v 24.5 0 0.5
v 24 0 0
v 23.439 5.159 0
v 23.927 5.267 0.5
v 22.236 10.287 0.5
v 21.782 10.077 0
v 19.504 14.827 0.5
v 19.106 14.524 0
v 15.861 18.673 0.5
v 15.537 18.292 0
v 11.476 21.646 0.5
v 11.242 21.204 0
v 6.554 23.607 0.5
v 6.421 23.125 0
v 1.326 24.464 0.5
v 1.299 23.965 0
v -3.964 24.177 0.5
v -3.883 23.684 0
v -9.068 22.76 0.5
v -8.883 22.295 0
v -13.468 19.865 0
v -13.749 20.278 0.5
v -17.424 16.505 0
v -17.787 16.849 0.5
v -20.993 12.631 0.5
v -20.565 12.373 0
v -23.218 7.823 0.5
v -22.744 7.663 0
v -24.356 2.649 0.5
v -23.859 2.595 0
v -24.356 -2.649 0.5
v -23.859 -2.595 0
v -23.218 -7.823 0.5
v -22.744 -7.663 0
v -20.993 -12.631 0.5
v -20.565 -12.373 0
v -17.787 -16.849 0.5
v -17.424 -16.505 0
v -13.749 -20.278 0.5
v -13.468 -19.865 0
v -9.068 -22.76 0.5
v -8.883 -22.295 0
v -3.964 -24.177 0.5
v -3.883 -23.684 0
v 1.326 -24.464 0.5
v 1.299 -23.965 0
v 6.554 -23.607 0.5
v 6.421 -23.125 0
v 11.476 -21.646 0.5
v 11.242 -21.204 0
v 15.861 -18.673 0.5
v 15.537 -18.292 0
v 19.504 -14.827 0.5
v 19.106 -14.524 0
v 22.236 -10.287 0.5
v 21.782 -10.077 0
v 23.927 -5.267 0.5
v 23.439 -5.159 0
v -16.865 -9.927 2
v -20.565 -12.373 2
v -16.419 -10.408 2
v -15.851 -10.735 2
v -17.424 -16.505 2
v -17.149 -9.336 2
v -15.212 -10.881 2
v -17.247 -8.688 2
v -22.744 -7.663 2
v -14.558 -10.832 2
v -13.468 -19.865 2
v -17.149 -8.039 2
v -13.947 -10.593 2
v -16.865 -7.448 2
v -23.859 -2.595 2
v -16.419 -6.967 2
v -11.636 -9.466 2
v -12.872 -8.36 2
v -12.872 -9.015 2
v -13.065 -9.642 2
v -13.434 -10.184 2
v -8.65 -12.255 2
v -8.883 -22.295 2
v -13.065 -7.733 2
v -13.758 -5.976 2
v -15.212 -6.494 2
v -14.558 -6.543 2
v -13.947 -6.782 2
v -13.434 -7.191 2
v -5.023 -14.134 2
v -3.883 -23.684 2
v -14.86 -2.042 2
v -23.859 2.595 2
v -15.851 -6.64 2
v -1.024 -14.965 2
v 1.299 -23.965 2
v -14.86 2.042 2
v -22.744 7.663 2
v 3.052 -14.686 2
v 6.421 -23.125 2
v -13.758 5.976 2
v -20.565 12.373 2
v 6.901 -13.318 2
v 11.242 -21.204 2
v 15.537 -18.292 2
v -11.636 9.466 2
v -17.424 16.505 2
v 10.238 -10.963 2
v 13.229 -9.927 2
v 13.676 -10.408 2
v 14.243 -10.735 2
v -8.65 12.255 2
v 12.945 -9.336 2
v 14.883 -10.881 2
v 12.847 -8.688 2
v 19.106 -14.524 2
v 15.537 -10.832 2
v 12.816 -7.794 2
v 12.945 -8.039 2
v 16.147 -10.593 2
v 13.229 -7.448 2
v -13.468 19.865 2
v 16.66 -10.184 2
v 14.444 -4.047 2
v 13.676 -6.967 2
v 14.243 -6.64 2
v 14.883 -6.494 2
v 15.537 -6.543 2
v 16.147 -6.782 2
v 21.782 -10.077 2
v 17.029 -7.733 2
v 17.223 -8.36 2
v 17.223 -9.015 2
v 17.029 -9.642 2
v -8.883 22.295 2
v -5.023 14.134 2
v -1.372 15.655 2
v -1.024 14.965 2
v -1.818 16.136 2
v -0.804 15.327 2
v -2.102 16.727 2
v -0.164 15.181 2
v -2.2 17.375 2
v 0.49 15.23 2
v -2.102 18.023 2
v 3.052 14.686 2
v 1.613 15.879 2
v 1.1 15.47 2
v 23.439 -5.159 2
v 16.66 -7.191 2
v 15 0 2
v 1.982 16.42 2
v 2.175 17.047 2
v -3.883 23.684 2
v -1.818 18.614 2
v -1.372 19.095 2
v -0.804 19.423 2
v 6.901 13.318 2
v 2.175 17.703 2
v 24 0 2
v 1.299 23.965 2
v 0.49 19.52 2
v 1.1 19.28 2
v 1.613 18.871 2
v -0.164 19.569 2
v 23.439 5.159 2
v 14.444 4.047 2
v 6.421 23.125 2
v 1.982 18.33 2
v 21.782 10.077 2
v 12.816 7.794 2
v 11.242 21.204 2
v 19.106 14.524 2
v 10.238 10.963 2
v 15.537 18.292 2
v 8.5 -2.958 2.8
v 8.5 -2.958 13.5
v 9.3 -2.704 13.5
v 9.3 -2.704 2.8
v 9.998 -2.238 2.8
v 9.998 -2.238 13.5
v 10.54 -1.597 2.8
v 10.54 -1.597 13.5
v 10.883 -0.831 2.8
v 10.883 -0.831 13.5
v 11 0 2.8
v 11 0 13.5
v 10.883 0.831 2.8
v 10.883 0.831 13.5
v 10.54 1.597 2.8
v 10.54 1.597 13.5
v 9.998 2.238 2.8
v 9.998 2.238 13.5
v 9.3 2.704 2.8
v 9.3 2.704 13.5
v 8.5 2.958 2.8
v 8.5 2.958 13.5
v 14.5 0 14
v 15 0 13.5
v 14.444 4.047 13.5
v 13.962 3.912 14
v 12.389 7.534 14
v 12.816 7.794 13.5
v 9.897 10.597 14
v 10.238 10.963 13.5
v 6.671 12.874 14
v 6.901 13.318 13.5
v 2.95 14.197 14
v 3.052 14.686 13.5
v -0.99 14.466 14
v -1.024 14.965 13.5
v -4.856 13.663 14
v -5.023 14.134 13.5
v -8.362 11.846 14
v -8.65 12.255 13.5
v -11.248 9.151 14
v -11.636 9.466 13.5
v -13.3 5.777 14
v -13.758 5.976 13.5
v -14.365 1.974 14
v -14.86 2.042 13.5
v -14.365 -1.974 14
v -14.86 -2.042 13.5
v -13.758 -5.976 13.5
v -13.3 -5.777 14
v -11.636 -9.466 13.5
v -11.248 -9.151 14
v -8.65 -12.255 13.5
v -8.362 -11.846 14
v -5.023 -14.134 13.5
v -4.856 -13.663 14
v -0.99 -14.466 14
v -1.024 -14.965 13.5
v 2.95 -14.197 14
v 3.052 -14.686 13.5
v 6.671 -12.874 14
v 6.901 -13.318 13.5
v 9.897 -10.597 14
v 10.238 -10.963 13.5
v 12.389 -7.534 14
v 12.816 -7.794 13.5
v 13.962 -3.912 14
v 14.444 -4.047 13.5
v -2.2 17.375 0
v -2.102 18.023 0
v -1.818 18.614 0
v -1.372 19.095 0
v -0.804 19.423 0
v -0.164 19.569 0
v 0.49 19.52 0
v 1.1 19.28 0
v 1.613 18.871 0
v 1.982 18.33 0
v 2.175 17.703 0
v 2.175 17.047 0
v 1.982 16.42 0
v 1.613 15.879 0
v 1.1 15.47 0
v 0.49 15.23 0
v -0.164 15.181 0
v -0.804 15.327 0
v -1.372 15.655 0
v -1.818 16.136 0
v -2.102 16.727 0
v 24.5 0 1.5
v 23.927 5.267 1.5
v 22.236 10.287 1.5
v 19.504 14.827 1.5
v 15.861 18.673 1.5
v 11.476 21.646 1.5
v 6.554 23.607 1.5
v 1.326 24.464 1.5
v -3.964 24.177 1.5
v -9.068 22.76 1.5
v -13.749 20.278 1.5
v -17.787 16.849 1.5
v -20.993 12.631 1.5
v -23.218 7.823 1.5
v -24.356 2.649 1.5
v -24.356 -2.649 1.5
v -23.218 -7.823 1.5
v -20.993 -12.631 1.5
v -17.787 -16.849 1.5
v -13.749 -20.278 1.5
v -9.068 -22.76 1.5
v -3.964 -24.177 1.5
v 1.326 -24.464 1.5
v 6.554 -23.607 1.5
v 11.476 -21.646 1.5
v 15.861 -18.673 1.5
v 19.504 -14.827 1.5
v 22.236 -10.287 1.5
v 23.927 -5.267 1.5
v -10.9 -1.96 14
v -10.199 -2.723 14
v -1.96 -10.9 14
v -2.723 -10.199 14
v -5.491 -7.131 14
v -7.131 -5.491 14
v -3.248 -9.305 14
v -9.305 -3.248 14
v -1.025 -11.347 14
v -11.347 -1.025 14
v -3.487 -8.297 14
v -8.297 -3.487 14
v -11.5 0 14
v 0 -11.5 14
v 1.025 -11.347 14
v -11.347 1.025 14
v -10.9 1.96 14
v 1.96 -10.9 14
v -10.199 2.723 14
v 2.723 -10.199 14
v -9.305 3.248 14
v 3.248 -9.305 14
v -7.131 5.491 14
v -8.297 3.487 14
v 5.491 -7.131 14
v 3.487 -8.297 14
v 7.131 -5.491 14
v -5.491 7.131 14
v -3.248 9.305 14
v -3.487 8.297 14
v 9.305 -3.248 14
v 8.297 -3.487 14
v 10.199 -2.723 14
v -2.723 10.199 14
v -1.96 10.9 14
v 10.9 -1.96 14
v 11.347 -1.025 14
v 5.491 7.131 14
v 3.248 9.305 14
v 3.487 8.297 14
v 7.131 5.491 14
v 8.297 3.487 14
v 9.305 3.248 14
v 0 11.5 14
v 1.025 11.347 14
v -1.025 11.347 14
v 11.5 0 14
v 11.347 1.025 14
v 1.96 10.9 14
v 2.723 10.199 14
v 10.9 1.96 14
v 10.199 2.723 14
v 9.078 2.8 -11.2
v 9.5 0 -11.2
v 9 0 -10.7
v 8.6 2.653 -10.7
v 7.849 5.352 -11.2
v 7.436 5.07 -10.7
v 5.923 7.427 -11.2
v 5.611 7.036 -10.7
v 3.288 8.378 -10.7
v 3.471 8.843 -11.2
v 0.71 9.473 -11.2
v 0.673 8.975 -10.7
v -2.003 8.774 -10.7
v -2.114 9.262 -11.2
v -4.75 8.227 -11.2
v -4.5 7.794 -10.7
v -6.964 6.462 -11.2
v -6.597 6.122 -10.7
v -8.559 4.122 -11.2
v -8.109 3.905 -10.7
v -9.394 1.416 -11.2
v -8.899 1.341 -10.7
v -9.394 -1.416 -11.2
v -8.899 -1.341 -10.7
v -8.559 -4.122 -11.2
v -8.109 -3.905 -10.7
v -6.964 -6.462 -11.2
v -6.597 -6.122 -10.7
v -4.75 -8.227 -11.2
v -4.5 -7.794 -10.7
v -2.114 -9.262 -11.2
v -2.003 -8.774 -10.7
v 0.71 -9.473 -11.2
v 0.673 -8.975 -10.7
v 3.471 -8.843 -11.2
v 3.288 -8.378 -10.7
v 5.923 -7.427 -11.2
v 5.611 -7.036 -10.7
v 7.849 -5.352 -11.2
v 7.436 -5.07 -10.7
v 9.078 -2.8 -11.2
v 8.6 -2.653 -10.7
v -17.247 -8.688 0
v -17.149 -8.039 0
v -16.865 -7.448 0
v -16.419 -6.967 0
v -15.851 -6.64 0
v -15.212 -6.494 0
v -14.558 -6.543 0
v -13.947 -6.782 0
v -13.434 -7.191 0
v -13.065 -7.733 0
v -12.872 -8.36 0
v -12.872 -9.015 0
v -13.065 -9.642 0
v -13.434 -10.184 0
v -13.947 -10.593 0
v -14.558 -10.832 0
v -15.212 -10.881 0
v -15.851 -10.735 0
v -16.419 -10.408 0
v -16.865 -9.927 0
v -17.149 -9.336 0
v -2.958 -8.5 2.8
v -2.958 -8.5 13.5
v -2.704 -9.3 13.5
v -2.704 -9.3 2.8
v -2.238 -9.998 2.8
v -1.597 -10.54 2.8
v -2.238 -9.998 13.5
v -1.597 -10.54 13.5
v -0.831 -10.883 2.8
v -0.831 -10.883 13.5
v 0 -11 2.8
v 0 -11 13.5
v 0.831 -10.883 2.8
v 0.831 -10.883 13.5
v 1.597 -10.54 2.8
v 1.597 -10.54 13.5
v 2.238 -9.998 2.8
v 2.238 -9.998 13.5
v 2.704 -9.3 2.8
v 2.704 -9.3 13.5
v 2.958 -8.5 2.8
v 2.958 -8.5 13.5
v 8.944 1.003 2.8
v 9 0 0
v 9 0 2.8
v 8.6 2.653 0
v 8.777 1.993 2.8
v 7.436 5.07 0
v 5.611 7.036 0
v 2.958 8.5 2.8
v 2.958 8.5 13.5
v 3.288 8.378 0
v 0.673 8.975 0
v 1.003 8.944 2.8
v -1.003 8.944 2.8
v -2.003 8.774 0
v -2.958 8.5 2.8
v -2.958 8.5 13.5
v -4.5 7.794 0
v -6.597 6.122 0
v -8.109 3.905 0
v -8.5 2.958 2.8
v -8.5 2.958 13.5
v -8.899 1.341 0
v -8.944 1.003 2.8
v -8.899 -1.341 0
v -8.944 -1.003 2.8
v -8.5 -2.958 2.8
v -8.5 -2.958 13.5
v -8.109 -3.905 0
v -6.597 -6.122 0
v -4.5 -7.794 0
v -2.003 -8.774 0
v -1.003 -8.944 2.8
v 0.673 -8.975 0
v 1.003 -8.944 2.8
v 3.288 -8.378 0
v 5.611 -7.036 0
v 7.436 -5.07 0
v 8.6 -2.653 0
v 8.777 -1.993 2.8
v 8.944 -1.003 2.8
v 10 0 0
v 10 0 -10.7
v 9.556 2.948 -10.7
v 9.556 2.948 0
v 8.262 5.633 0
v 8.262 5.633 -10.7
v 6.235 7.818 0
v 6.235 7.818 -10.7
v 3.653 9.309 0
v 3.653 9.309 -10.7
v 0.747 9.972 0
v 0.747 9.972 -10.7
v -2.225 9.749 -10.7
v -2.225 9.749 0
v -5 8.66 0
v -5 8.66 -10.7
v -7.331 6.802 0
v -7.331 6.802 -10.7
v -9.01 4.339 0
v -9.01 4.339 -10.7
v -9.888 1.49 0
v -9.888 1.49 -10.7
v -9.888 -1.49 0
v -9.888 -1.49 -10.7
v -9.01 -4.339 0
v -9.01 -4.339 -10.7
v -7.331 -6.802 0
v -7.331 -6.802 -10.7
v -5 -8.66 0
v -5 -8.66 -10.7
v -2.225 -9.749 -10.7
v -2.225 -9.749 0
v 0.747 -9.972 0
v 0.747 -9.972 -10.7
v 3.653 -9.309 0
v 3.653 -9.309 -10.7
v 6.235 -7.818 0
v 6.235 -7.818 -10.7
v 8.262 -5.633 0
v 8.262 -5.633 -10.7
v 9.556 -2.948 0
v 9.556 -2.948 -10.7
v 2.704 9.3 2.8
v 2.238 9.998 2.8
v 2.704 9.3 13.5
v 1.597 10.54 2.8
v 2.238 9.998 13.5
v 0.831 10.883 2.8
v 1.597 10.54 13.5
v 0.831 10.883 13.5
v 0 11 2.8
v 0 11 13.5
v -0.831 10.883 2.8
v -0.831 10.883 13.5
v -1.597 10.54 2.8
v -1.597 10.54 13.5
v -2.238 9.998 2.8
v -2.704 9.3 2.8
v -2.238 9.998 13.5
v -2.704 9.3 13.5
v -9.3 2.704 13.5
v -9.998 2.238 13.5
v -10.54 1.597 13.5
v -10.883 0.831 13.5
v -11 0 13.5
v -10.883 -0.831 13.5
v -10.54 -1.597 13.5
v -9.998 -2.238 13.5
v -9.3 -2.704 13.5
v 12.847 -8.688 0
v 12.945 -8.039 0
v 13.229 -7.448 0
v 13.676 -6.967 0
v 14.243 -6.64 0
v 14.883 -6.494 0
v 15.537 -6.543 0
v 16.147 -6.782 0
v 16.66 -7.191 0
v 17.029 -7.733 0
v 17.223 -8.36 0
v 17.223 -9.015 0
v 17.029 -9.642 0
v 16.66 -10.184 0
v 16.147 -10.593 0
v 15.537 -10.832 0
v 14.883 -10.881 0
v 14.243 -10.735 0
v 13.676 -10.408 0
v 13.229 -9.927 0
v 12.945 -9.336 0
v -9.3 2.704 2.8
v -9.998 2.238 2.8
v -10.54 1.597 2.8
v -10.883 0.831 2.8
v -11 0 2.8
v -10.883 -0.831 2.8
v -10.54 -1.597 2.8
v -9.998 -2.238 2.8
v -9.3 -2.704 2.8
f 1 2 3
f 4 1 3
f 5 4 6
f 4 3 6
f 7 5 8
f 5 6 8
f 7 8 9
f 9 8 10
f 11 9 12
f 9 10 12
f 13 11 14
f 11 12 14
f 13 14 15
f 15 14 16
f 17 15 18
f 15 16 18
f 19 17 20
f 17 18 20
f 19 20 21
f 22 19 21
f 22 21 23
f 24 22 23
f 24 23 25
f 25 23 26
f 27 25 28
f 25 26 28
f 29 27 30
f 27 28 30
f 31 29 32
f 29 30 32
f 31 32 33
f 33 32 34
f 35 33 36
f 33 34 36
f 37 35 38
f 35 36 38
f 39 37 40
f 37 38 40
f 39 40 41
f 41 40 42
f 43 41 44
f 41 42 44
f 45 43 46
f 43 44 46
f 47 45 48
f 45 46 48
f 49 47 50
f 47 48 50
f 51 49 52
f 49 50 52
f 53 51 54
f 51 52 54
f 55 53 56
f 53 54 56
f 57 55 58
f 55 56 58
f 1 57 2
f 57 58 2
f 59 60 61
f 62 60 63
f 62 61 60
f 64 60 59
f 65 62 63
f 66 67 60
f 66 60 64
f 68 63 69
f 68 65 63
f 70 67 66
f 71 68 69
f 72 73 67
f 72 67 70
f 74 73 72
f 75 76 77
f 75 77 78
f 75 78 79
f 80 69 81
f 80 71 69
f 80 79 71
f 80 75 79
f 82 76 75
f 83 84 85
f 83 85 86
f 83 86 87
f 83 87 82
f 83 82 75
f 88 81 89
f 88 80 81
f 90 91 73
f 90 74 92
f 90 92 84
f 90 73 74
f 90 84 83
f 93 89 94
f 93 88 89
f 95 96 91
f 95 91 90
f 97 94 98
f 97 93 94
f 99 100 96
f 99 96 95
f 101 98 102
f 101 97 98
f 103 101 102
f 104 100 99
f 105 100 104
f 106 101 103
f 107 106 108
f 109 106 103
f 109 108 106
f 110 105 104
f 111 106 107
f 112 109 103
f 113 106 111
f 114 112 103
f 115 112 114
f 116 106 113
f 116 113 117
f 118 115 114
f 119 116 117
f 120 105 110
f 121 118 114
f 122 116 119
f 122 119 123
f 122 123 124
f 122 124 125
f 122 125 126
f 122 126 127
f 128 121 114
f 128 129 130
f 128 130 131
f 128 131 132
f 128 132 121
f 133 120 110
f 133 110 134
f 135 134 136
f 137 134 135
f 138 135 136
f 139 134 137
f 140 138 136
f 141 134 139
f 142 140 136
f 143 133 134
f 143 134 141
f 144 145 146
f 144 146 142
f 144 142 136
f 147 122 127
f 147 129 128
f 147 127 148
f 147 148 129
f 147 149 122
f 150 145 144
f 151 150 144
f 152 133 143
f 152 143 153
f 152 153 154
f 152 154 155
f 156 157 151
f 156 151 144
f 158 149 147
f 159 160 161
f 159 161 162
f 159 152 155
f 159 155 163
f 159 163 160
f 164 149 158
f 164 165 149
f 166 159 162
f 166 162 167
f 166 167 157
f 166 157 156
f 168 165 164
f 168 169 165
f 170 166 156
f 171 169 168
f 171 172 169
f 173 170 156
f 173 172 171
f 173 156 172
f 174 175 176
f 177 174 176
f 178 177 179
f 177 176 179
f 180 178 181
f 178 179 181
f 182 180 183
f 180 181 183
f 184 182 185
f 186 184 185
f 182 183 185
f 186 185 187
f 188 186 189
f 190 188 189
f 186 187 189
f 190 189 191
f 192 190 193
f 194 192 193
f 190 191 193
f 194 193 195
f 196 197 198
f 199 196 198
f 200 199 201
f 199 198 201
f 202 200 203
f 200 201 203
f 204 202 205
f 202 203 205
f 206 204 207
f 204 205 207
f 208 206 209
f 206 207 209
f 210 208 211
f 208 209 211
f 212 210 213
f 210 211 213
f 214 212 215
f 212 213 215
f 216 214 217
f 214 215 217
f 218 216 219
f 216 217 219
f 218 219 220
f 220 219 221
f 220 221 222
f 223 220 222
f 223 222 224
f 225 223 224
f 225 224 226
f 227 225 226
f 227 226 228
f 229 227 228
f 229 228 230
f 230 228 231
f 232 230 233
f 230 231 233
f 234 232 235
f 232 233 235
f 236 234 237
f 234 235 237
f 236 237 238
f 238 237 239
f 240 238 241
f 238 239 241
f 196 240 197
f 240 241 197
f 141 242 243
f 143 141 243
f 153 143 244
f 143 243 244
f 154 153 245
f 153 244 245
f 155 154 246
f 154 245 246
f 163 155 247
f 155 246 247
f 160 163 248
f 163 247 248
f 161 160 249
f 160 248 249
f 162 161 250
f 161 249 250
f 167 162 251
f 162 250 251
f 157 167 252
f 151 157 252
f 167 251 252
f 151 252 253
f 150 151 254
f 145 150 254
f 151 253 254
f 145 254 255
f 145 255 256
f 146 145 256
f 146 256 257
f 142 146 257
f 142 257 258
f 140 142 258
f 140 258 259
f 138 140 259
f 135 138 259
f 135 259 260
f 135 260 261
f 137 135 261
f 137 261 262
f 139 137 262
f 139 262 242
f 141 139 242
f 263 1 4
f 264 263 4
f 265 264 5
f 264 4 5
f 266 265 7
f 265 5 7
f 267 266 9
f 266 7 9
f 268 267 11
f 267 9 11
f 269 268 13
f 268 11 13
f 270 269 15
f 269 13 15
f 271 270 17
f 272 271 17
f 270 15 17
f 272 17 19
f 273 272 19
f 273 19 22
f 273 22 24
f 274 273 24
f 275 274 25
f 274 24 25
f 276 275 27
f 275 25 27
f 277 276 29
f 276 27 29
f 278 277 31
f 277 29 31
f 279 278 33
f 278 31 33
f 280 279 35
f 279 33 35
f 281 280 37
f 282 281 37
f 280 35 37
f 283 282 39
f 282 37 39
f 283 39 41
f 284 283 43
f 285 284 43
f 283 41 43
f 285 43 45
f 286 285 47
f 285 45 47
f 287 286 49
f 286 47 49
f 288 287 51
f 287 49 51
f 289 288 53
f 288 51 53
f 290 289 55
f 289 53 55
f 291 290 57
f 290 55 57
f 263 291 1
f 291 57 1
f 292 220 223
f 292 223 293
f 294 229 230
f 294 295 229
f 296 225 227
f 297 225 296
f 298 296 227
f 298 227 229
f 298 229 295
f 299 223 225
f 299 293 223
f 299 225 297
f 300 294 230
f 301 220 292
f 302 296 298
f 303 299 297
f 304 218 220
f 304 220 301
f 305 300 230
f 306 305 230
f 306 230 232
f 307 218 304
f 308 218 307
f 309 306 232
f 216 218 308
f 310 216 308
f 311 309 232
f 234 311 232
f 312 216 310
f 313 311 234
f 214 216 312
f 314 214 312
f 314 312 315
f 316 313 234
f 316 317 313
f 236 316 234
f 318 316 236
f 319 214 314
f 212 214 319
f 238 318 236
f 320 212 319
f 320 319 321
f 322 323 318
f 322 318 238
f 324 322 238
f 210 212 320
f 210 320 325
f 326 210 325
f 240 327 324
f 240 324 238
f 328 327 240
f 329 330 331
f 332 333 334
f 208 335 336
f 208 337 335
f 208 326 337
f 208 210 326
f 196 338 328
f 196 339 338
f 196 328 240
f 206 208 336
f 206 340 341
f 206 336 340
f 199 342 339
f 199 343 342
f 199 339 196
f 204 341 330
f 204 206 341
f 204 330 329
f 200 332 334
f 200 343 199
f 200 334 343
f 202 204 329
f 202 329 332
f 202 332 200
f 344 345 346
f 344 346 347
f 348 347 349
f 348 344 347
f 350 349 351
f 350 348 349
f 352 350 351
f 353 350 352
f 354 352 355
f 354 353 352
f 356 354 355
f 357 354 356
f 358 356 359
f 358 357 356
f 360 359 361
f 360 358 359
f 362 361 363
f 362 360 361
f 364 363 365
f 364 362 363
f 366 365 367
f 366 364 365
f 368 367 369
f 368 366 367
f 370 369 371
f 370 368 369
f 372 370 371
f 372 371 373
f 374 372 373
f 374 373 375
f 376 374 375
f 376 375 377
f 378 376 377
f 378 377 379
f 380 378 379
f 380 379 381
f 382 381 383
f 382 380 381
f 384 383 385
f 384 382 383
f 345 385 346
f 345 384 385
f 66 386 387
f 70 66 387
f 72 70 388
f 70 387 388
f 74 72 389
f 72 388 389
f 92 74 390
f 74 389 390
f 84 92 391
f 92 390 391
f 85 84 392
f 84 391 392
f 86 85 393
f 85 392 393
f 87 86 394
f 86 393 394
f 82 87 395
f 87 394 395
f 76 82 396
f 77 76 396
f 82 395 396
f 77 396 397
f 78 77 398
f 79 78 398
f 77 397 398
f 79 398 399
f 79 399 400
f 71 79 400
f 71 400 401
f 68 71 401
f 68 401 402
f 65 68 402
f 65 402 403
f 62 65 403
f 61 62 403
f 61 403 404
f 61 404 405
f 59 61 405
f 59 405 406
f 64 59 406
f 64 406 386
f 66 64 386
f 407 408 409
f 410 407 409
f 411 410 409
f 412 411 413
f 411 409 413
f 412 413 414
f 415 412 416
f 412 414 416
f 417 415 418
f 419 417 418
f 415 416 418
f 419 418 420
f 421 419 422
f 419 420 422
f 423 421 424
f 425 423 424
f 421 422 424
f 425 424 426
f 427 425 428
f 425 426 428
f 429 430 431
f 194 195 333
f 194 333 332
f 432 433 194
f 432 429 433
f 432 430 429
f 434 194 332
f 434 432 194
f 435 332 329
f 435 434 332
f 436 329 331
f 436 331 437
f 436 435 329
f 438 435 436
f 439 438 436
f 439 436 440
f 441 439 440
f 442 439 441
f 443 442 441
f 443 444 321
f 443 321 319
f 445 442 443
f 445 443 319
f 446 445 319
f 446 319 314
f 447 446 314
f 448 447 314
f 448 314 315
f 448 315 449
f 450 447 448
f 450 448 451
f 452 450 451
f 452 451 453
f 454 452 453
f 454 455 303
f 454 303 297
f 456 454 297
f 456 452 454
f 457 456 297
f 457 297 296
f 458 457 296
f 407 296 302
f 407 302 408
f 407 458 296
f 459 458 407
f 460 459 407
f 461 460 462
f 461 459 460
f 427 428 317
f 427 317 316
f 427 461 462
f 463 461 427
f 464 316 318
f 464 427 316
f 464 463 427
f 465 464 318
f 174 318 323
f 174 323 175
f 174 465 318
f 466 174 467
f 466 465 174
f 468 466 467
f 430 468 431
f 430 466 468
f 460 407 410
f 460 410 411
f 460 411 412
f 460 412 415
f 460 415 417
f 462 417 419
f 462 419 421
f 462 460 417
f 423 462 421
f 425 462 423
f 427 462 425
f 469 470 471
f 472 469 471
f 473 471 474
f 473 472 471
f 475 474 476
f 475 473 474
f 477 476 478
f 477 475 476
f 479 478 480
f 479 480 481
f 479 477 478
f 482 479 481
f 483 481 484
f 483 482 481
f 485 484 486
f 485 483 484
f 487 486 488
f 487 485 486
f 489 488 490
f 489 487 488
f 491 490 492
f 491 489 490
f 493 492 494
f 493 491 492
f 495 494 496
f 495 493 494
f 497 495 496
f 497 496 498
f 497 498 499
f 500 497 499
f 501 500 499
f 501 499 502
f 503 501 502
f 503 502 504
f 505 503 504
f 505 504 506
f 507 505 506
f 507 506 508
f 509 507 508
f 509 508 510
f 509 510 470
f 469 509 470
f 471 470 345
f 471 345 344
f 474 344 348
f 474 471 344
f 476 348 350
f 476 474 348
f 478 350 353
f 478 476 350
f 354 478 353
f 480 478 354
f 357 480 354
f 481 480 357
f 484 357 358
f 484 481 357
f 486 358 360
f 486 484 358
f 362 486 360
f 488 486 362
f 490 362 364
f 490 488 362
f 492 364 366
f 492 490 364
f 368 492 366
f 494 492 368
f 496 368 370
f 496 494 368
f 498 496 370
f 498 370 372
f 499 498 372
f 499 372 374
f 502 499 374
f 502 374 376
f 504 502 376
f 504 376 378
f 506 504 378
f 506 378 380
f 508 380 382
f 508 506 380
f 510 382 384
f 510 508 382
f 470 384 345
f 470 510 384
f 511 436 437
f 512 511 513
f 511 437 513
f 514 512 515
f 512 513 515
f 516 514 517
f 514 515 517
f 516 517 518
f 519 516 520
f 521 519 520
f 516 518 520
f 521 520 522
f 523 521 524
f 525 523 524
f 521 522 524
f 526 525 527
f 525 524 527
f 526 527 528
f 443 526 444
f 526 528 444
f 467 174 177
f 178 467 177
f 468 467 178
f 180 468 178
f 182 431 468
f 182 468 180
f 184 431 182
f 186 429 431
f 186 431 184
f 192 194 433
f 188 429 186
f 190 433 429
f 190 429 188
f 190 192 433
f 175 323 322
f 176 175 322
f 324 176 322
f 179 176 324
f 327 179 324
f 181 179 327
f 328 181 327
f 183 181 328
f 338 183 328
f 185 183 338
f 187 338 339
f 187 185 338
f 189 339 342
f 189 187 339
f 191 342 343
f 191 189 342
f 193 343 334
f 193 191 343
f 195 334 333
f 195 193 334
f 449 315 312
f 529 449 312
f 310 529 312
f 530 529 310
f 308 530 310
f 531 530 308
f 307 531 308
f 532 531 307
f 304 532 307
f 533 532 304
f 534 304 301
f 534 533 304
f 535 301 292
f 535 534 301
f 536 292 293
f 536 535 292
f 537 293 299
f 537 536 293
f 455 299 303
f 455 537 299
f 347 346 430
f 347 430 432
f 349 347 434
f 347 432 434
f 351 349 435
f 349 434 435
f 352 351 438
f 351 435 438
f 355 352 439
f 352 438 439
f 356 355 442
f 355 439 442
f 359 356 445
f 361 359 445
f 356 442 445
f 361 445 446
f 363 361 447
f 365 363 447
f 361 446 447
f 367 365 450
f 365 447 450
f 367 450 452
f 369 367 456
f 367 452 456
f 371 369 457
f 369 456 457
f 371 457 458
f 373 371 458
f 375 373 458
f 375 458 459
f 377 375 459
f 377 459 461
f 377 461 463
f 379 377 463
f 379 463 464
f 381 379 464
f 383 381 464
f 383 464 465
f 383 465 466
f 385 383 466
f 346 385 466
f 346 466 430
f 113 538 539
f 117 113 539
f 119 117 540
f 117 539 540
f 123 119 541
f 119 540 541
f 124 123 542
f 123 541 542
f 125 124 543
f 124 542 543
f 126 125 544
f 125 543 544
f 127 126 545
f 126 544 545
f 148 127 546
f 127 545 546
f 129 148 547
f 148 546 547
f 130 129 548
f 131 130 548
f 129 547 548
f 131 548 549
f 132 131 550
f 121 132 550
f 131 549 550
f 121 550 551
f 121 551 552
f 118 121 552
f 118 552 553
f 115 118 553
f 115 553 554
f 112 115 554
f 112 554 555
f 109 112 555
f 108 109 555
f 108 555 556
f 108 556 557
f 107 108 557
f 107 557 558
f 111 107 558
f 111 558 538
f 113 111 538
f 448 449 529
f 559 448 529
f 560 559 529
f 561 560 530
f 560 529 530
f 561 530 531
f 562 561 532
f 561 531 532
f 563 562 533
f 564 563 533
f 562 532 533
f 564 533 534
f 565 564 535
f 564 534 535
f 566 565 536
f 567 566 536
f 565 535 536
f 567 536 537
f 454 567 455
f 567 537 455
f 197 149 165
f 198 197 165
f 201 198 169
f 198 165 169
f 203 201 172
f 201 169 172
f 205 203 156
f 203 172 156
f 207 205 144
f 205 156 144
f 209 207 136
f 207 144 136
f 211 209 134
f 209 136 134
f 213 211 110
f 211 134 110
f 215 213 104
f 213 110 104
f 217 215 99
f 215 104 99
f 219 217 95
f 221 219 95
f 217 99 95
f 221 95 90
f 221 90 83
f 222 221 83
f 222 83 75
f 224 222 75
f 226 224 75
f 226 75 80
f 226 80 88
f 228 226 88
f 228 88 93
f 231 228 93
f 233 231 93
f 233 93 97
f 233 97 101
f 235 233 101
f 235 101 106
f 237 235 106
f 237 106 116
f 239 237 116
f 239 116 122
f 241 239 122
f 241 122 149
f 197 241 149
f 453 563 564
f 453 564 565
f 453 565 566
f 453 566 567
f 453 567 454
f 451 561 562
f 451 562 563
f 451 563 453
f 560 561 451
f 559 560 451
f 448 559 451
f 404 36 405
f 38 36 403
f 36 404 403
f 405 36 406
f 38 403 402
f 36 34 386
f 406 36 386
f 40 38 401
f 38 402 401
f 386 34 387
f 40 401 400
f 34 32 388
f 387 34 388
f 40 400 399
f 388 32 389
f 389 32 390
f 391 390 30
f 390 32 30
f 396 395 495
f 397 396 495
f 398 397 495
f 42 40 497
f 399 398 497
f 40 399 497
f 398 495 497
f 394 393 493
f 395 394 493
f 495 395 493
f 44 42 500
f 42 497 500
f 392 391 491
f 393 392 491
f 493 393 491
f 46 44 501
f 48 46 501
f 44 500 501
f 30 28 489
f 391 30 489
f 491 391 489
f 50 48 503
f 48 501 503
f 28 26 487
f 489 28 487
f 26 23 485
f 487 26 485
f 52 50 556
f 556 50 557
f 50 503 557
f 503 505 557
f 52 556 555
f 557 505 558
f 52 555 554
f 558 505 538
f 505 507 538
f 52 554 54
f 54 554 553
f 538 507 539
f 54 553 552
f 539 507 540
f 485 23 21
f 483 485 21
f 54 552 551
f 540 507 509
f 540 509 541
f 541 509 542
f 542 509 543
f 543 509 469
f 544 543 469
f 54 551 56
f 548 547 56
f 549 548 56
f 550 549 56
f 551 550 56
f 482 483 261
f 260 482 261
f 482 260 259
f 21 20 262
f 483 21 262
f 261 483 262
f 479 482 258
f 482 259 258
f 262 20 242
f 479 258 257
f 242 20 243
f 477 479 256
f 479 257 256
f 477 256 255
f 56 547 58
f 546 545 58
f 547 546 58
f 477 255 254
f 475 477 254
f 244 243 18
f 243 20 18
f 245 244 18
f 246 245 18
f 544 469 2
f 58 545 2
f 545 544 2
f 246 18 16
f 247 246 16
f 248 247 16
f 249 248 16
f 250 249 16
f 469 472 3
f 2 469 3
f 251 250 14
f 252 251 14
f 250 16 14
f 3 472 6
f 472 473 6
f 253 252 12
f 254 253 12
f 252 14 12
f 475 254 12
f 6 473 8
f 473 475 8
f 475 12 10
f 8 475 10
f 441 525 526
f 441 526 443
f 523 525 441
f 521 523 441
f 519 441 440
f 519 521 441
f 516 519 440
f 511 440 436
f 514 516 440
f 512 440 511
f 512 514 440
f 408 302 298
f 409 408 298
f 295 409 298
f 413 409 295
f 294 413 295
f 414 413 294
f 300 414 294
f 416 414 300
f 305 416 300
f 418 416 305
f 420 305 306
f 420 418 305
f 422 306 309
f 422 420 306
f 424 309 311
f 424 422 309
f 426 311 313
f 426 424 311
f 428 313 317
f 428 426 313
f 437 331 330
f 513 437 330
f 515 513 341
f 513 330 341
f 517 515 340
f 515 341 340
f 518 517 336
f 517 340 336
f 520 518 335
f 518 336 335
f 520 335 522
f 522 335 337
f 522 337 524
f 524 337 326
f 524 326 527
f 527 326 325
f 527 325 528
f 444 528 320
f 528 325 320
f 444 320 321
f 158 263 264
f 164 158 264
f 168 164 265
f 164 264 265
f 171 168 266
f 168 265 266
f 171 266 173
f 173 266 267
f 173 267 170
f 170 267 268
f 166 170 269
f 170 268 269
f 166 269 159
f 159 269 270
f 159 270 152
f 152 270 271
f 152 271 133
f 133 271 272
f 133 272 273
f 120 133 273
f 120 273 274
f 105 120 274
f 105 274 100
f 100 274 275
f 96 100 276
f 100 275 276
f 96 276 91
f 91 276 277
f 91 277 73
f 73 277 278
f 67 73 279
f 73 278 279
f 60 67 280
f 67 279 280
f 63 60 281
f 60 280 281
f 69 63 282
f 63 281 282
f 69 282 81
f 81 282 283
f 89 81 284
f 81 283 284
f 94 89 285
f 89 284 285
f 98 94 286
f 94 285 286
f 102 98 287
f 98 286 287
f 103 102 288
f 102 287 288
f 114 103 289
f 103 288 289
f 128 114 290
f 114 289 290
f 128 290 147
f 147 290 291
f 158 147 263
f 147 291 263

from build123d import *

# Parameters (mm, degrees)
F0_R      = 24.5
F0_R_2    = 15
F1_DEPTH  = 2
F2_R      = 15
F3_DEPTH  = 14
F5_DEPTH  = 11.2
F6_R      = 10
F6_R_2    = 9
F7_DEPTH  = 14
F8_DEPTH  = 25
F10_D     = 4.4
F11_SIZE2 = 0.49999
F11_SIZE  = 0.49999


# Not quite as in the source:
# - a fillet or chamfer is up to 0.001 mm smaller than in the source, because OpenCascade refuses the exact size


with BuildPart() as f1:
    # F0 (on Top) → F1 (new body)
    with BuildSketch(Plane.XY):
        Circle(F0_R)
        Circle(F0_R_2, mode=Mode.SUBTRACT)
    extrude(amount=F1_DEPTH)

    # F2 (on Top) → F3 (join)
    with BuildSketch(Plane.XY):
        Circle(F2_R)
    extrude(amount=F3_DEPTH)

    # F4 (on face) → F5 (cut)
    with BuildSketch(Plane.XY.offset(14)):
        with BuildLine():
            ThreePointArc((7.4375, -2.9467938085), (7.8581168228, -1.5), (8, 0))
            ThreePointArc((8, 0), (7.8581168228, 1.5), (7.4375, 2.9467938085))
            ThreePointArc((7.4375, 2.9467938085), (5.6568542495, 5.6568542495), (2.9467938085, 7.4375))
            ThreePointArc((2.9467938085, 7.4375), (0, 8), (-2.9467938085, 7.4375))
            ThreePointArc((-2.9467938085, 7.4375), (-5.6568542495, 5.6568542495), (-7.4375, 2.9467938085))
            ThreePointArc((-7.4375, 2.9467938085), (-8, 0), (-7.4375, -2.9467938085))
            ThreePointArc((-7.4375, -2.9467938085), (-5.6568542495, -5.6568542495), (-2.9467938085, -7.4375))
            ThreePointArc((-2.9467938085, -7.4375), (0, -8), (2.9467938085, -7.4375))
            ThreePointArc((2.9467938085, -7.4375), (5.6568542495, -5.6568542495), (7.4375, -2.9467938085))
        make_face()
        with BuildLine():
            ThreePointArc((7.4375, 2.9467938085), (7.8581168228, 1.5), (8, 0))
            ThreePointArc((8, 0), (7.8581168228, -1.5), (7.4375, -2.9467938085))
            ThreePointArc((7.4375, -2.9467938085), (11, 0), (7.4375, 2.9467938085))
        make_face()
        with BuildLine():
            ThreePointArc((-2.9467938085, 7.4375), (0, 8), (2.9467938085, 7.4375))
            ThreePointArc((2.9467938085, 7.4375), (0, 11), (-2.9467938085, 7.4375))
        make_face()
        with BuildLine():
            ThreePointArc((-2.9467938085, -7.4375), (0, -11), (2.9467938085, -7.4375))
            ThreePointArc((2.9467938085, -7.4375), (0, -8), (-2.9467938085, -7.4375))
        make_face()
        with BuildLine():
            ThreePointArc((-7.4375, -2.9467938085), (-8, 0), (-7.4375, 2.9467938085))
            ThreePointArc((-7.4375, 2.9467938085), (-11, 0), (-7.4375, -2.9467938085))
        make_face()
    extrude(amount=-F5_DEPTH, mode=Mode.SUBTRACT)

    # F6 (on face) → F7 (join)
    with BuildSketch(Plane.XY.offset(2.8)):
        Circle(F6_R)
        Circle(F6_R_2, mode=Mode.SUBTRACT)
    extrude(amount=-F7_DEPTH)

    # F8 (cut): a face of the model
    f8_faces = [f1.faces().sort_by_distance(p)[0] for p in [
        (0, 0, 0),
    ]]
    extrude(f8_faces, amount=-F8_DEPTH, mode=Mode.SUBTRACT)

    # F10 (through all)
    with Locations(Plane.XY.offset(2)):
        with Locations((0, 17.375), (-15.0471913908, -8.6875), (15.0471913908, -8.6875)):
            Hole(F10_D / 2)

    # F11 (size 0.5 and 0.5 in the source; OpenCascade refuses exactly that, so slightly less here)
    f11_edges = [f1.edges().sort_by_distance(p)[0] for p in [
        (-15, 0, 14),
        (-24.5, 0, 2),
        (-24.5, 0, 0),
        (0, 11, 14),
        (11, 0, 14),
        (0, -11, 14),
        (-11, 0, 14),
        (-10, 0, -11.2),
        (-9, 0, -11.2),
    ]]
    chamfer(f11_edges, length=F11_SIZE, length2=F11_SIZE2)


solid = f1.part
